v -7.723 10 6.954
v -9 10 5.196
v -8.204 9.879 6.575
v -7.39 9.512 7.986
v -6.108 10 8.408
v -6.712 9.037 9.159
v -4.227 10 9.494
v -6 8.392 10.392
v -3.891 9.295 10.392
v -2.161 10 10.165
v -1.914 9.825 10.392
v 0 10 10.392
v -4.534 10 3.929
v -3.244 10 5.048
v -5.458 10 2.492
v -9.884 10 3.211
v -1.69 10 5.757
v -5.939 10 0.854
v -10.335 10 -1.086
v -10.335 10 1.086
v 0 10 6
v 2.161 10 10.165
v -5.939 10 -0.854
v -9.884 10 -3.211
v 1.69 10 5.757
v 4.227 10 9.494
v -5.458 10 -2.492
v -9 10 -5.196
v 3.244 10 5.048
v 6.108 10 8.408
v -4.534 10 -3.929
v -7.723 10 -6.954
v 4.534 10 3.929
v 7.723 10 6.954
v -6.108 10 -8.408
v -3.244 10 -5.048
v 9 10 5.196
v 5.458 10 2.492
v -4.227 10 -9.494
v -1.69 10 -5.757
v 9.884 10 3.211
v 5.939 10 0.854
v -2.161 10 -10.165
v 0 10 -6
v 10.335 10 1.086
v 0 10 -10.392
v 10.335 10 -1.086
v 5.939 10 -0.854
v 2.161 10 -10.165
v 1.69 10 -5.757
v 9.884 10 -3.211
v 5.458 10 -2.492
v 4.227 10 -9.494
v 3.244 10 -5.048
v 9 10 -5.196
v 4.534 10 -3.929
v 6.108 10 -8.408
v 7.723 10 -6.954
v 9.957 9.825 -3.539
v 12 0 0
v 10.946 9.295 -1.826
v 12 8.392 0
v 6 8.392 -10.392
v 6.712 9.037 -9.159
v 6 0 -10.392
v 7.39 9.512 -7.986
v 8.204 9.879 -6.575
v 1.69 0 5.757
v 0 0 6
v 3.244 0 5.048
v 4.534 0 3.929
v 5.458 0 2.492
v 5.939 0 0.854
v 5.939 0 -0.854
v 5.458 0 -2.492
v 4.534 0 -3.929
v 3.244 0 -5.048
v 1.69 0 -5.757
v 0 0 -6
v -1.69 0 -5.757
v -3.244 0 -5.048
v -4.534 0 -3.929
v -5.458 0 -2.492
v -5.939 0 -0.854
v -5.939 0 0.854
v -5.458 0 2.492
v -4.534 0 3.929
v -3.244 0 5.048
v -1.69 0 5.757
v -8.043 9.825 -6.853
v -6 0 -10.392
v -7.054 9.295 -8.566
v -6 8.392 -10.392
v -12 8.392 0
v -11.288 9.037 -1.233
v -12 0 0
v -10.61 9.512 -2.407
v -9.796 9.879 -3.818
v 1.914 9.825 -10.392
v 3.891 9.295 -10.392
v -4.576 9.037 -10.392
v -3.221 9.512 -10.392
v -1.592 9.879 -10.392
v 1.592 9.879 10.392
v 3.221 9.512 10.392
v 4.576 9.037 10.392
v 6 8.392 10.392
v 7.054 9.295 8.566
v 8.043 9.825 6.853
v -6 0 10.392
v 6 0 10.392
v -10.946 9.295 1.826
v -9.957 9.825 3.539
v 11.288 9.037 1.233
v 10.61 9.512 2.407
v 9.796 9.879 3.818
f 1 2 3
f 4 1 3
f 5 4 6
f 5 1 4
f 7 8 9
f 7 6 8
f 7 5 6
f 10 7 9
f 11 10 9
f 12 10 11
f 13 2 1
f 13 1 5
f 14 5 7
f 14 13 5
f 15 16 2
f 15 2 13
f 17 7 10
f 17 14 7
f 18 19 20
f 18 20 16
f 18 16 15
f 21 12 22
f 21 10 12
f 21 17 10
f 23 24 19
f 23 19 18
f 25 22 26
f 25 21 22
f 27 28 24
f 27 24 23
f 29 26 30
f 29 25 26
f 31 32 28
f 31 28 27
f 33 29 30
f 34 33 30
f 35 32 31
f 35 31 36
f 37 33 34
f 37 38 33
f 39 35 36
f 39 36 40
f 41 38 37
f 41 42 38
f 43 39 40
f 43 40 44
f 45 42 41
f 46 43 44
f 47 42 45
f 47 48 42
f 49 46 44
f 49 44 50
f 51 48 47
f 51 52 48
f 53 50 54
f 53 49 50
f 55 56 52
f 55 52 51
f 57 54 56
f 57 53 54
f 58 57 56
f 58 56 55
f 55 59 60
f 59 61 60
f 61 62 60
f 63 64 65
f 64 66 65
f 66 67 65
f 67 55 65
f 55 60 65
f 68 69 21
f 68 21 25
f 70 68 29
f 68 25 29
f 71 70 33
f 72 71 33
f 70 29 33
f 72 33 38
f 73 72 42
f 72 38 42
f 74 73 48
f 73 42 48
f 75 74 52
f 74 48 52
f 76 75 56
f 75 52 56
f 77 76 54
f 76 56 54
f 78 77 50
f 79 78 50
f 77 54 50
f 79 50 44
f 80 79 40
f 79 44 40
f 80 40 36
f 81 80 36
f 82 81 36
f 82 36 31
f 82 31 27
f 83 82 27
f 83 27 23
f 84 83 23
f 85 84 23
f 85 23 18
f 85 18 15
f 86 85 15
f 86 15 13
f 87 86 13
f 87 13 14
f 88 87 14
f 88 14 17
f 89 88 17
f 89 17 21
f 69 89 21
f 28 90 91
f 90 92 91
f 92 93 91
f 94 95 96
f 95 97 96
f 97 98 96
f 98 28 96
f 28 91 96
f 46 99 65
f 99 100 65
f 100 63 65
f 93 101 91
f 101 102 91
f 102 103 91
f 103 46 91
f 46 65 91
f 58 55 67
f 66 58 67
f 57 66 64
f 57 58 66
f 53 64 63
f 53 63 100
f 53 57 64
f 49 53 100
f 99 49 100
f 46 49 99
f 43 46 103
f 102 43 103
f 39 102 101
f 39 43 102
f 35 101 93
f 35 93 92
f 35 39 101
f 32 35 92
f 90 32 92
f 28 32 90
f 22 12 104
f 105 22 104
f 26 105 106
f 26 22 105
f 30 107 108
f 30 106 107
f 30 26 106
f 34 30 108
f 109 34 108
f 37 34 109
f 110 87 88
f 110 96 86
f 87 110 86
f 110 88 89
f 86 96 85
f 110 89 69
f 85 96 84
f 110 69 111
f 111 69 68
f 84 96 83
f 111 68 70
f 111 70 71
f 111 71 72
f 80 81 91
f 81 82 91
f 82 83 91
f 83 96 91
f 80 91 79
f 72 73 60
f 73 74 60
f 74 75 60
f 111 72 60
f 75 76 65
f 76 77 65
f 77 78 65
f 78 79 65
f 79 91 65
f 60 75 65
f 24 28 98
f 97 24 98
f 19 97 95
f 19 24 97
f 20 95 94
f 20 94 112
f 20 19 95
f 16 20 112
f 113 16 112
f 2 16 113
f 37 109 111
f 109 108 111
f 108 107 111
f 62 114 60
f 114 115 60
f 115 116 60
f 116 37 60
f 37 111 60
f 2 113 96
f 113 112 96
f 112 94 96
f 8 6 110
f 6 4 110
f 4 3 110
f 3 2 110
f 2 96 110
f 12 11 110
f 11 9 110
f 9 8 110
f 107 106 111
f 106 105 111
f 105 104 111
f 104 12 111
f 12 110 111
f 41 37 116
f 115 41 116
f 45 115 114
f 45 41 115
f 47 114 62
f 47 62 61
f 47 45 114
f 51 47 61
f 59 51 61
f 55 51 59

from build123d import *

# Parameters (mm, degrees)
BOSS_EXTRUDE1_DEPTH = 10
SKETCH2_OUTSIDE_W   = 56.658
SKETCH2_OUTSIDE_H   = 53.442
SKETCH2_OUTSIDE_R   = 10.392304845
CUT_EXTRUDE2_DEPTH  = 12
CUT_EXTRUDE2_DRAFT  = -45
CUT_EXTRUDE3_REACH  = 20.762
SKETCH3_R           = 6


with BuildPart() as part:
    # Sketch1 → Boss-Extrude1 (new body)
    with BuildSketch(Plane(origin=(0, 0, 0), x_dir=(1, 0, 0), z_dir=(0, 1, 0))):
        Polygon((6, -10.392304845), (12, 0), (6, 10.392304845), (-6, 10.392304845), (-12, 0), (-6, -10.392304845), align=None)
    extrude(amount=BOSS_EXTRUDE1_DEPTH)


with BuildPart() as cut_extrude2_tool:
    # Sketch2 outside → Cut-Extrude2 (with draft: the straight prism first)
    with BuildSketch(Plane(origin=(0, 10, 0), x_dir=(1, 0, 0), z_dir=(0, 1, 0))):
        Rectangle(SKETCH2_OUTSIDE_W, SKETCH2_OUTSIDE_H)
        Circle(SKETCH2_OUTSIDE_R, mode=Mode.SUBTRACT)
    extrude(amount=-CUT_EXTRUDE2_DEPTH)
    # Cut-Extrude2: the draft: its side faces are tilted about the plane it starts from
    cut_extrude2_sides = [cut_extrude2_tool.faces().sort_by_distance(p)[0] for p in [
        (0, 4, 26.721),
        (28.329, 4, 0),
        (0, 4, -26.721),
        (-28.329, 4, 0),
        (-10.392304845, 4, 0),
    ]]
    draft(cut_extrude2_sides, Plane(origin=(0, 10, 0), x_dir=(1, 0, 0), z_dir=(0, 1, 0)), CUT_EXTRUDE2_DRAFT)


with BuildPart() as part_1:
    add(part.part)

    # Cut-Extrude2: cut by cut_extrude2_tool
    add(cut_extrude2_tool.part, mode=Mode.SUBTRACT)

    # Sketch3 → Cut-Extrude3 (cut, up to next)
    with BuildSketch(Plane(origin=(0, 10, 0), x_dir=(1, 0, 0), z_dir=(0, 1, 0)), mode=Mode.PRIVATE) as cut_extrude3_sk1:
        with Locations(Location((0, 0, 0), (0, 0, 270))):
            Circle(SKETCH3_R)
    cut_extrude3_tool1 = extrude(cut_extrude3_sk1.sketch, amount=-CUT_EXTRUDE3_REACH, mode=Mode.PRIVATE) & part_1.part
    add(cut_extrude3_tool1.solids().sort_by_distance((0, 10, 0))[0], mode=Mode.SUBTRACT)


solid = part_1.part
